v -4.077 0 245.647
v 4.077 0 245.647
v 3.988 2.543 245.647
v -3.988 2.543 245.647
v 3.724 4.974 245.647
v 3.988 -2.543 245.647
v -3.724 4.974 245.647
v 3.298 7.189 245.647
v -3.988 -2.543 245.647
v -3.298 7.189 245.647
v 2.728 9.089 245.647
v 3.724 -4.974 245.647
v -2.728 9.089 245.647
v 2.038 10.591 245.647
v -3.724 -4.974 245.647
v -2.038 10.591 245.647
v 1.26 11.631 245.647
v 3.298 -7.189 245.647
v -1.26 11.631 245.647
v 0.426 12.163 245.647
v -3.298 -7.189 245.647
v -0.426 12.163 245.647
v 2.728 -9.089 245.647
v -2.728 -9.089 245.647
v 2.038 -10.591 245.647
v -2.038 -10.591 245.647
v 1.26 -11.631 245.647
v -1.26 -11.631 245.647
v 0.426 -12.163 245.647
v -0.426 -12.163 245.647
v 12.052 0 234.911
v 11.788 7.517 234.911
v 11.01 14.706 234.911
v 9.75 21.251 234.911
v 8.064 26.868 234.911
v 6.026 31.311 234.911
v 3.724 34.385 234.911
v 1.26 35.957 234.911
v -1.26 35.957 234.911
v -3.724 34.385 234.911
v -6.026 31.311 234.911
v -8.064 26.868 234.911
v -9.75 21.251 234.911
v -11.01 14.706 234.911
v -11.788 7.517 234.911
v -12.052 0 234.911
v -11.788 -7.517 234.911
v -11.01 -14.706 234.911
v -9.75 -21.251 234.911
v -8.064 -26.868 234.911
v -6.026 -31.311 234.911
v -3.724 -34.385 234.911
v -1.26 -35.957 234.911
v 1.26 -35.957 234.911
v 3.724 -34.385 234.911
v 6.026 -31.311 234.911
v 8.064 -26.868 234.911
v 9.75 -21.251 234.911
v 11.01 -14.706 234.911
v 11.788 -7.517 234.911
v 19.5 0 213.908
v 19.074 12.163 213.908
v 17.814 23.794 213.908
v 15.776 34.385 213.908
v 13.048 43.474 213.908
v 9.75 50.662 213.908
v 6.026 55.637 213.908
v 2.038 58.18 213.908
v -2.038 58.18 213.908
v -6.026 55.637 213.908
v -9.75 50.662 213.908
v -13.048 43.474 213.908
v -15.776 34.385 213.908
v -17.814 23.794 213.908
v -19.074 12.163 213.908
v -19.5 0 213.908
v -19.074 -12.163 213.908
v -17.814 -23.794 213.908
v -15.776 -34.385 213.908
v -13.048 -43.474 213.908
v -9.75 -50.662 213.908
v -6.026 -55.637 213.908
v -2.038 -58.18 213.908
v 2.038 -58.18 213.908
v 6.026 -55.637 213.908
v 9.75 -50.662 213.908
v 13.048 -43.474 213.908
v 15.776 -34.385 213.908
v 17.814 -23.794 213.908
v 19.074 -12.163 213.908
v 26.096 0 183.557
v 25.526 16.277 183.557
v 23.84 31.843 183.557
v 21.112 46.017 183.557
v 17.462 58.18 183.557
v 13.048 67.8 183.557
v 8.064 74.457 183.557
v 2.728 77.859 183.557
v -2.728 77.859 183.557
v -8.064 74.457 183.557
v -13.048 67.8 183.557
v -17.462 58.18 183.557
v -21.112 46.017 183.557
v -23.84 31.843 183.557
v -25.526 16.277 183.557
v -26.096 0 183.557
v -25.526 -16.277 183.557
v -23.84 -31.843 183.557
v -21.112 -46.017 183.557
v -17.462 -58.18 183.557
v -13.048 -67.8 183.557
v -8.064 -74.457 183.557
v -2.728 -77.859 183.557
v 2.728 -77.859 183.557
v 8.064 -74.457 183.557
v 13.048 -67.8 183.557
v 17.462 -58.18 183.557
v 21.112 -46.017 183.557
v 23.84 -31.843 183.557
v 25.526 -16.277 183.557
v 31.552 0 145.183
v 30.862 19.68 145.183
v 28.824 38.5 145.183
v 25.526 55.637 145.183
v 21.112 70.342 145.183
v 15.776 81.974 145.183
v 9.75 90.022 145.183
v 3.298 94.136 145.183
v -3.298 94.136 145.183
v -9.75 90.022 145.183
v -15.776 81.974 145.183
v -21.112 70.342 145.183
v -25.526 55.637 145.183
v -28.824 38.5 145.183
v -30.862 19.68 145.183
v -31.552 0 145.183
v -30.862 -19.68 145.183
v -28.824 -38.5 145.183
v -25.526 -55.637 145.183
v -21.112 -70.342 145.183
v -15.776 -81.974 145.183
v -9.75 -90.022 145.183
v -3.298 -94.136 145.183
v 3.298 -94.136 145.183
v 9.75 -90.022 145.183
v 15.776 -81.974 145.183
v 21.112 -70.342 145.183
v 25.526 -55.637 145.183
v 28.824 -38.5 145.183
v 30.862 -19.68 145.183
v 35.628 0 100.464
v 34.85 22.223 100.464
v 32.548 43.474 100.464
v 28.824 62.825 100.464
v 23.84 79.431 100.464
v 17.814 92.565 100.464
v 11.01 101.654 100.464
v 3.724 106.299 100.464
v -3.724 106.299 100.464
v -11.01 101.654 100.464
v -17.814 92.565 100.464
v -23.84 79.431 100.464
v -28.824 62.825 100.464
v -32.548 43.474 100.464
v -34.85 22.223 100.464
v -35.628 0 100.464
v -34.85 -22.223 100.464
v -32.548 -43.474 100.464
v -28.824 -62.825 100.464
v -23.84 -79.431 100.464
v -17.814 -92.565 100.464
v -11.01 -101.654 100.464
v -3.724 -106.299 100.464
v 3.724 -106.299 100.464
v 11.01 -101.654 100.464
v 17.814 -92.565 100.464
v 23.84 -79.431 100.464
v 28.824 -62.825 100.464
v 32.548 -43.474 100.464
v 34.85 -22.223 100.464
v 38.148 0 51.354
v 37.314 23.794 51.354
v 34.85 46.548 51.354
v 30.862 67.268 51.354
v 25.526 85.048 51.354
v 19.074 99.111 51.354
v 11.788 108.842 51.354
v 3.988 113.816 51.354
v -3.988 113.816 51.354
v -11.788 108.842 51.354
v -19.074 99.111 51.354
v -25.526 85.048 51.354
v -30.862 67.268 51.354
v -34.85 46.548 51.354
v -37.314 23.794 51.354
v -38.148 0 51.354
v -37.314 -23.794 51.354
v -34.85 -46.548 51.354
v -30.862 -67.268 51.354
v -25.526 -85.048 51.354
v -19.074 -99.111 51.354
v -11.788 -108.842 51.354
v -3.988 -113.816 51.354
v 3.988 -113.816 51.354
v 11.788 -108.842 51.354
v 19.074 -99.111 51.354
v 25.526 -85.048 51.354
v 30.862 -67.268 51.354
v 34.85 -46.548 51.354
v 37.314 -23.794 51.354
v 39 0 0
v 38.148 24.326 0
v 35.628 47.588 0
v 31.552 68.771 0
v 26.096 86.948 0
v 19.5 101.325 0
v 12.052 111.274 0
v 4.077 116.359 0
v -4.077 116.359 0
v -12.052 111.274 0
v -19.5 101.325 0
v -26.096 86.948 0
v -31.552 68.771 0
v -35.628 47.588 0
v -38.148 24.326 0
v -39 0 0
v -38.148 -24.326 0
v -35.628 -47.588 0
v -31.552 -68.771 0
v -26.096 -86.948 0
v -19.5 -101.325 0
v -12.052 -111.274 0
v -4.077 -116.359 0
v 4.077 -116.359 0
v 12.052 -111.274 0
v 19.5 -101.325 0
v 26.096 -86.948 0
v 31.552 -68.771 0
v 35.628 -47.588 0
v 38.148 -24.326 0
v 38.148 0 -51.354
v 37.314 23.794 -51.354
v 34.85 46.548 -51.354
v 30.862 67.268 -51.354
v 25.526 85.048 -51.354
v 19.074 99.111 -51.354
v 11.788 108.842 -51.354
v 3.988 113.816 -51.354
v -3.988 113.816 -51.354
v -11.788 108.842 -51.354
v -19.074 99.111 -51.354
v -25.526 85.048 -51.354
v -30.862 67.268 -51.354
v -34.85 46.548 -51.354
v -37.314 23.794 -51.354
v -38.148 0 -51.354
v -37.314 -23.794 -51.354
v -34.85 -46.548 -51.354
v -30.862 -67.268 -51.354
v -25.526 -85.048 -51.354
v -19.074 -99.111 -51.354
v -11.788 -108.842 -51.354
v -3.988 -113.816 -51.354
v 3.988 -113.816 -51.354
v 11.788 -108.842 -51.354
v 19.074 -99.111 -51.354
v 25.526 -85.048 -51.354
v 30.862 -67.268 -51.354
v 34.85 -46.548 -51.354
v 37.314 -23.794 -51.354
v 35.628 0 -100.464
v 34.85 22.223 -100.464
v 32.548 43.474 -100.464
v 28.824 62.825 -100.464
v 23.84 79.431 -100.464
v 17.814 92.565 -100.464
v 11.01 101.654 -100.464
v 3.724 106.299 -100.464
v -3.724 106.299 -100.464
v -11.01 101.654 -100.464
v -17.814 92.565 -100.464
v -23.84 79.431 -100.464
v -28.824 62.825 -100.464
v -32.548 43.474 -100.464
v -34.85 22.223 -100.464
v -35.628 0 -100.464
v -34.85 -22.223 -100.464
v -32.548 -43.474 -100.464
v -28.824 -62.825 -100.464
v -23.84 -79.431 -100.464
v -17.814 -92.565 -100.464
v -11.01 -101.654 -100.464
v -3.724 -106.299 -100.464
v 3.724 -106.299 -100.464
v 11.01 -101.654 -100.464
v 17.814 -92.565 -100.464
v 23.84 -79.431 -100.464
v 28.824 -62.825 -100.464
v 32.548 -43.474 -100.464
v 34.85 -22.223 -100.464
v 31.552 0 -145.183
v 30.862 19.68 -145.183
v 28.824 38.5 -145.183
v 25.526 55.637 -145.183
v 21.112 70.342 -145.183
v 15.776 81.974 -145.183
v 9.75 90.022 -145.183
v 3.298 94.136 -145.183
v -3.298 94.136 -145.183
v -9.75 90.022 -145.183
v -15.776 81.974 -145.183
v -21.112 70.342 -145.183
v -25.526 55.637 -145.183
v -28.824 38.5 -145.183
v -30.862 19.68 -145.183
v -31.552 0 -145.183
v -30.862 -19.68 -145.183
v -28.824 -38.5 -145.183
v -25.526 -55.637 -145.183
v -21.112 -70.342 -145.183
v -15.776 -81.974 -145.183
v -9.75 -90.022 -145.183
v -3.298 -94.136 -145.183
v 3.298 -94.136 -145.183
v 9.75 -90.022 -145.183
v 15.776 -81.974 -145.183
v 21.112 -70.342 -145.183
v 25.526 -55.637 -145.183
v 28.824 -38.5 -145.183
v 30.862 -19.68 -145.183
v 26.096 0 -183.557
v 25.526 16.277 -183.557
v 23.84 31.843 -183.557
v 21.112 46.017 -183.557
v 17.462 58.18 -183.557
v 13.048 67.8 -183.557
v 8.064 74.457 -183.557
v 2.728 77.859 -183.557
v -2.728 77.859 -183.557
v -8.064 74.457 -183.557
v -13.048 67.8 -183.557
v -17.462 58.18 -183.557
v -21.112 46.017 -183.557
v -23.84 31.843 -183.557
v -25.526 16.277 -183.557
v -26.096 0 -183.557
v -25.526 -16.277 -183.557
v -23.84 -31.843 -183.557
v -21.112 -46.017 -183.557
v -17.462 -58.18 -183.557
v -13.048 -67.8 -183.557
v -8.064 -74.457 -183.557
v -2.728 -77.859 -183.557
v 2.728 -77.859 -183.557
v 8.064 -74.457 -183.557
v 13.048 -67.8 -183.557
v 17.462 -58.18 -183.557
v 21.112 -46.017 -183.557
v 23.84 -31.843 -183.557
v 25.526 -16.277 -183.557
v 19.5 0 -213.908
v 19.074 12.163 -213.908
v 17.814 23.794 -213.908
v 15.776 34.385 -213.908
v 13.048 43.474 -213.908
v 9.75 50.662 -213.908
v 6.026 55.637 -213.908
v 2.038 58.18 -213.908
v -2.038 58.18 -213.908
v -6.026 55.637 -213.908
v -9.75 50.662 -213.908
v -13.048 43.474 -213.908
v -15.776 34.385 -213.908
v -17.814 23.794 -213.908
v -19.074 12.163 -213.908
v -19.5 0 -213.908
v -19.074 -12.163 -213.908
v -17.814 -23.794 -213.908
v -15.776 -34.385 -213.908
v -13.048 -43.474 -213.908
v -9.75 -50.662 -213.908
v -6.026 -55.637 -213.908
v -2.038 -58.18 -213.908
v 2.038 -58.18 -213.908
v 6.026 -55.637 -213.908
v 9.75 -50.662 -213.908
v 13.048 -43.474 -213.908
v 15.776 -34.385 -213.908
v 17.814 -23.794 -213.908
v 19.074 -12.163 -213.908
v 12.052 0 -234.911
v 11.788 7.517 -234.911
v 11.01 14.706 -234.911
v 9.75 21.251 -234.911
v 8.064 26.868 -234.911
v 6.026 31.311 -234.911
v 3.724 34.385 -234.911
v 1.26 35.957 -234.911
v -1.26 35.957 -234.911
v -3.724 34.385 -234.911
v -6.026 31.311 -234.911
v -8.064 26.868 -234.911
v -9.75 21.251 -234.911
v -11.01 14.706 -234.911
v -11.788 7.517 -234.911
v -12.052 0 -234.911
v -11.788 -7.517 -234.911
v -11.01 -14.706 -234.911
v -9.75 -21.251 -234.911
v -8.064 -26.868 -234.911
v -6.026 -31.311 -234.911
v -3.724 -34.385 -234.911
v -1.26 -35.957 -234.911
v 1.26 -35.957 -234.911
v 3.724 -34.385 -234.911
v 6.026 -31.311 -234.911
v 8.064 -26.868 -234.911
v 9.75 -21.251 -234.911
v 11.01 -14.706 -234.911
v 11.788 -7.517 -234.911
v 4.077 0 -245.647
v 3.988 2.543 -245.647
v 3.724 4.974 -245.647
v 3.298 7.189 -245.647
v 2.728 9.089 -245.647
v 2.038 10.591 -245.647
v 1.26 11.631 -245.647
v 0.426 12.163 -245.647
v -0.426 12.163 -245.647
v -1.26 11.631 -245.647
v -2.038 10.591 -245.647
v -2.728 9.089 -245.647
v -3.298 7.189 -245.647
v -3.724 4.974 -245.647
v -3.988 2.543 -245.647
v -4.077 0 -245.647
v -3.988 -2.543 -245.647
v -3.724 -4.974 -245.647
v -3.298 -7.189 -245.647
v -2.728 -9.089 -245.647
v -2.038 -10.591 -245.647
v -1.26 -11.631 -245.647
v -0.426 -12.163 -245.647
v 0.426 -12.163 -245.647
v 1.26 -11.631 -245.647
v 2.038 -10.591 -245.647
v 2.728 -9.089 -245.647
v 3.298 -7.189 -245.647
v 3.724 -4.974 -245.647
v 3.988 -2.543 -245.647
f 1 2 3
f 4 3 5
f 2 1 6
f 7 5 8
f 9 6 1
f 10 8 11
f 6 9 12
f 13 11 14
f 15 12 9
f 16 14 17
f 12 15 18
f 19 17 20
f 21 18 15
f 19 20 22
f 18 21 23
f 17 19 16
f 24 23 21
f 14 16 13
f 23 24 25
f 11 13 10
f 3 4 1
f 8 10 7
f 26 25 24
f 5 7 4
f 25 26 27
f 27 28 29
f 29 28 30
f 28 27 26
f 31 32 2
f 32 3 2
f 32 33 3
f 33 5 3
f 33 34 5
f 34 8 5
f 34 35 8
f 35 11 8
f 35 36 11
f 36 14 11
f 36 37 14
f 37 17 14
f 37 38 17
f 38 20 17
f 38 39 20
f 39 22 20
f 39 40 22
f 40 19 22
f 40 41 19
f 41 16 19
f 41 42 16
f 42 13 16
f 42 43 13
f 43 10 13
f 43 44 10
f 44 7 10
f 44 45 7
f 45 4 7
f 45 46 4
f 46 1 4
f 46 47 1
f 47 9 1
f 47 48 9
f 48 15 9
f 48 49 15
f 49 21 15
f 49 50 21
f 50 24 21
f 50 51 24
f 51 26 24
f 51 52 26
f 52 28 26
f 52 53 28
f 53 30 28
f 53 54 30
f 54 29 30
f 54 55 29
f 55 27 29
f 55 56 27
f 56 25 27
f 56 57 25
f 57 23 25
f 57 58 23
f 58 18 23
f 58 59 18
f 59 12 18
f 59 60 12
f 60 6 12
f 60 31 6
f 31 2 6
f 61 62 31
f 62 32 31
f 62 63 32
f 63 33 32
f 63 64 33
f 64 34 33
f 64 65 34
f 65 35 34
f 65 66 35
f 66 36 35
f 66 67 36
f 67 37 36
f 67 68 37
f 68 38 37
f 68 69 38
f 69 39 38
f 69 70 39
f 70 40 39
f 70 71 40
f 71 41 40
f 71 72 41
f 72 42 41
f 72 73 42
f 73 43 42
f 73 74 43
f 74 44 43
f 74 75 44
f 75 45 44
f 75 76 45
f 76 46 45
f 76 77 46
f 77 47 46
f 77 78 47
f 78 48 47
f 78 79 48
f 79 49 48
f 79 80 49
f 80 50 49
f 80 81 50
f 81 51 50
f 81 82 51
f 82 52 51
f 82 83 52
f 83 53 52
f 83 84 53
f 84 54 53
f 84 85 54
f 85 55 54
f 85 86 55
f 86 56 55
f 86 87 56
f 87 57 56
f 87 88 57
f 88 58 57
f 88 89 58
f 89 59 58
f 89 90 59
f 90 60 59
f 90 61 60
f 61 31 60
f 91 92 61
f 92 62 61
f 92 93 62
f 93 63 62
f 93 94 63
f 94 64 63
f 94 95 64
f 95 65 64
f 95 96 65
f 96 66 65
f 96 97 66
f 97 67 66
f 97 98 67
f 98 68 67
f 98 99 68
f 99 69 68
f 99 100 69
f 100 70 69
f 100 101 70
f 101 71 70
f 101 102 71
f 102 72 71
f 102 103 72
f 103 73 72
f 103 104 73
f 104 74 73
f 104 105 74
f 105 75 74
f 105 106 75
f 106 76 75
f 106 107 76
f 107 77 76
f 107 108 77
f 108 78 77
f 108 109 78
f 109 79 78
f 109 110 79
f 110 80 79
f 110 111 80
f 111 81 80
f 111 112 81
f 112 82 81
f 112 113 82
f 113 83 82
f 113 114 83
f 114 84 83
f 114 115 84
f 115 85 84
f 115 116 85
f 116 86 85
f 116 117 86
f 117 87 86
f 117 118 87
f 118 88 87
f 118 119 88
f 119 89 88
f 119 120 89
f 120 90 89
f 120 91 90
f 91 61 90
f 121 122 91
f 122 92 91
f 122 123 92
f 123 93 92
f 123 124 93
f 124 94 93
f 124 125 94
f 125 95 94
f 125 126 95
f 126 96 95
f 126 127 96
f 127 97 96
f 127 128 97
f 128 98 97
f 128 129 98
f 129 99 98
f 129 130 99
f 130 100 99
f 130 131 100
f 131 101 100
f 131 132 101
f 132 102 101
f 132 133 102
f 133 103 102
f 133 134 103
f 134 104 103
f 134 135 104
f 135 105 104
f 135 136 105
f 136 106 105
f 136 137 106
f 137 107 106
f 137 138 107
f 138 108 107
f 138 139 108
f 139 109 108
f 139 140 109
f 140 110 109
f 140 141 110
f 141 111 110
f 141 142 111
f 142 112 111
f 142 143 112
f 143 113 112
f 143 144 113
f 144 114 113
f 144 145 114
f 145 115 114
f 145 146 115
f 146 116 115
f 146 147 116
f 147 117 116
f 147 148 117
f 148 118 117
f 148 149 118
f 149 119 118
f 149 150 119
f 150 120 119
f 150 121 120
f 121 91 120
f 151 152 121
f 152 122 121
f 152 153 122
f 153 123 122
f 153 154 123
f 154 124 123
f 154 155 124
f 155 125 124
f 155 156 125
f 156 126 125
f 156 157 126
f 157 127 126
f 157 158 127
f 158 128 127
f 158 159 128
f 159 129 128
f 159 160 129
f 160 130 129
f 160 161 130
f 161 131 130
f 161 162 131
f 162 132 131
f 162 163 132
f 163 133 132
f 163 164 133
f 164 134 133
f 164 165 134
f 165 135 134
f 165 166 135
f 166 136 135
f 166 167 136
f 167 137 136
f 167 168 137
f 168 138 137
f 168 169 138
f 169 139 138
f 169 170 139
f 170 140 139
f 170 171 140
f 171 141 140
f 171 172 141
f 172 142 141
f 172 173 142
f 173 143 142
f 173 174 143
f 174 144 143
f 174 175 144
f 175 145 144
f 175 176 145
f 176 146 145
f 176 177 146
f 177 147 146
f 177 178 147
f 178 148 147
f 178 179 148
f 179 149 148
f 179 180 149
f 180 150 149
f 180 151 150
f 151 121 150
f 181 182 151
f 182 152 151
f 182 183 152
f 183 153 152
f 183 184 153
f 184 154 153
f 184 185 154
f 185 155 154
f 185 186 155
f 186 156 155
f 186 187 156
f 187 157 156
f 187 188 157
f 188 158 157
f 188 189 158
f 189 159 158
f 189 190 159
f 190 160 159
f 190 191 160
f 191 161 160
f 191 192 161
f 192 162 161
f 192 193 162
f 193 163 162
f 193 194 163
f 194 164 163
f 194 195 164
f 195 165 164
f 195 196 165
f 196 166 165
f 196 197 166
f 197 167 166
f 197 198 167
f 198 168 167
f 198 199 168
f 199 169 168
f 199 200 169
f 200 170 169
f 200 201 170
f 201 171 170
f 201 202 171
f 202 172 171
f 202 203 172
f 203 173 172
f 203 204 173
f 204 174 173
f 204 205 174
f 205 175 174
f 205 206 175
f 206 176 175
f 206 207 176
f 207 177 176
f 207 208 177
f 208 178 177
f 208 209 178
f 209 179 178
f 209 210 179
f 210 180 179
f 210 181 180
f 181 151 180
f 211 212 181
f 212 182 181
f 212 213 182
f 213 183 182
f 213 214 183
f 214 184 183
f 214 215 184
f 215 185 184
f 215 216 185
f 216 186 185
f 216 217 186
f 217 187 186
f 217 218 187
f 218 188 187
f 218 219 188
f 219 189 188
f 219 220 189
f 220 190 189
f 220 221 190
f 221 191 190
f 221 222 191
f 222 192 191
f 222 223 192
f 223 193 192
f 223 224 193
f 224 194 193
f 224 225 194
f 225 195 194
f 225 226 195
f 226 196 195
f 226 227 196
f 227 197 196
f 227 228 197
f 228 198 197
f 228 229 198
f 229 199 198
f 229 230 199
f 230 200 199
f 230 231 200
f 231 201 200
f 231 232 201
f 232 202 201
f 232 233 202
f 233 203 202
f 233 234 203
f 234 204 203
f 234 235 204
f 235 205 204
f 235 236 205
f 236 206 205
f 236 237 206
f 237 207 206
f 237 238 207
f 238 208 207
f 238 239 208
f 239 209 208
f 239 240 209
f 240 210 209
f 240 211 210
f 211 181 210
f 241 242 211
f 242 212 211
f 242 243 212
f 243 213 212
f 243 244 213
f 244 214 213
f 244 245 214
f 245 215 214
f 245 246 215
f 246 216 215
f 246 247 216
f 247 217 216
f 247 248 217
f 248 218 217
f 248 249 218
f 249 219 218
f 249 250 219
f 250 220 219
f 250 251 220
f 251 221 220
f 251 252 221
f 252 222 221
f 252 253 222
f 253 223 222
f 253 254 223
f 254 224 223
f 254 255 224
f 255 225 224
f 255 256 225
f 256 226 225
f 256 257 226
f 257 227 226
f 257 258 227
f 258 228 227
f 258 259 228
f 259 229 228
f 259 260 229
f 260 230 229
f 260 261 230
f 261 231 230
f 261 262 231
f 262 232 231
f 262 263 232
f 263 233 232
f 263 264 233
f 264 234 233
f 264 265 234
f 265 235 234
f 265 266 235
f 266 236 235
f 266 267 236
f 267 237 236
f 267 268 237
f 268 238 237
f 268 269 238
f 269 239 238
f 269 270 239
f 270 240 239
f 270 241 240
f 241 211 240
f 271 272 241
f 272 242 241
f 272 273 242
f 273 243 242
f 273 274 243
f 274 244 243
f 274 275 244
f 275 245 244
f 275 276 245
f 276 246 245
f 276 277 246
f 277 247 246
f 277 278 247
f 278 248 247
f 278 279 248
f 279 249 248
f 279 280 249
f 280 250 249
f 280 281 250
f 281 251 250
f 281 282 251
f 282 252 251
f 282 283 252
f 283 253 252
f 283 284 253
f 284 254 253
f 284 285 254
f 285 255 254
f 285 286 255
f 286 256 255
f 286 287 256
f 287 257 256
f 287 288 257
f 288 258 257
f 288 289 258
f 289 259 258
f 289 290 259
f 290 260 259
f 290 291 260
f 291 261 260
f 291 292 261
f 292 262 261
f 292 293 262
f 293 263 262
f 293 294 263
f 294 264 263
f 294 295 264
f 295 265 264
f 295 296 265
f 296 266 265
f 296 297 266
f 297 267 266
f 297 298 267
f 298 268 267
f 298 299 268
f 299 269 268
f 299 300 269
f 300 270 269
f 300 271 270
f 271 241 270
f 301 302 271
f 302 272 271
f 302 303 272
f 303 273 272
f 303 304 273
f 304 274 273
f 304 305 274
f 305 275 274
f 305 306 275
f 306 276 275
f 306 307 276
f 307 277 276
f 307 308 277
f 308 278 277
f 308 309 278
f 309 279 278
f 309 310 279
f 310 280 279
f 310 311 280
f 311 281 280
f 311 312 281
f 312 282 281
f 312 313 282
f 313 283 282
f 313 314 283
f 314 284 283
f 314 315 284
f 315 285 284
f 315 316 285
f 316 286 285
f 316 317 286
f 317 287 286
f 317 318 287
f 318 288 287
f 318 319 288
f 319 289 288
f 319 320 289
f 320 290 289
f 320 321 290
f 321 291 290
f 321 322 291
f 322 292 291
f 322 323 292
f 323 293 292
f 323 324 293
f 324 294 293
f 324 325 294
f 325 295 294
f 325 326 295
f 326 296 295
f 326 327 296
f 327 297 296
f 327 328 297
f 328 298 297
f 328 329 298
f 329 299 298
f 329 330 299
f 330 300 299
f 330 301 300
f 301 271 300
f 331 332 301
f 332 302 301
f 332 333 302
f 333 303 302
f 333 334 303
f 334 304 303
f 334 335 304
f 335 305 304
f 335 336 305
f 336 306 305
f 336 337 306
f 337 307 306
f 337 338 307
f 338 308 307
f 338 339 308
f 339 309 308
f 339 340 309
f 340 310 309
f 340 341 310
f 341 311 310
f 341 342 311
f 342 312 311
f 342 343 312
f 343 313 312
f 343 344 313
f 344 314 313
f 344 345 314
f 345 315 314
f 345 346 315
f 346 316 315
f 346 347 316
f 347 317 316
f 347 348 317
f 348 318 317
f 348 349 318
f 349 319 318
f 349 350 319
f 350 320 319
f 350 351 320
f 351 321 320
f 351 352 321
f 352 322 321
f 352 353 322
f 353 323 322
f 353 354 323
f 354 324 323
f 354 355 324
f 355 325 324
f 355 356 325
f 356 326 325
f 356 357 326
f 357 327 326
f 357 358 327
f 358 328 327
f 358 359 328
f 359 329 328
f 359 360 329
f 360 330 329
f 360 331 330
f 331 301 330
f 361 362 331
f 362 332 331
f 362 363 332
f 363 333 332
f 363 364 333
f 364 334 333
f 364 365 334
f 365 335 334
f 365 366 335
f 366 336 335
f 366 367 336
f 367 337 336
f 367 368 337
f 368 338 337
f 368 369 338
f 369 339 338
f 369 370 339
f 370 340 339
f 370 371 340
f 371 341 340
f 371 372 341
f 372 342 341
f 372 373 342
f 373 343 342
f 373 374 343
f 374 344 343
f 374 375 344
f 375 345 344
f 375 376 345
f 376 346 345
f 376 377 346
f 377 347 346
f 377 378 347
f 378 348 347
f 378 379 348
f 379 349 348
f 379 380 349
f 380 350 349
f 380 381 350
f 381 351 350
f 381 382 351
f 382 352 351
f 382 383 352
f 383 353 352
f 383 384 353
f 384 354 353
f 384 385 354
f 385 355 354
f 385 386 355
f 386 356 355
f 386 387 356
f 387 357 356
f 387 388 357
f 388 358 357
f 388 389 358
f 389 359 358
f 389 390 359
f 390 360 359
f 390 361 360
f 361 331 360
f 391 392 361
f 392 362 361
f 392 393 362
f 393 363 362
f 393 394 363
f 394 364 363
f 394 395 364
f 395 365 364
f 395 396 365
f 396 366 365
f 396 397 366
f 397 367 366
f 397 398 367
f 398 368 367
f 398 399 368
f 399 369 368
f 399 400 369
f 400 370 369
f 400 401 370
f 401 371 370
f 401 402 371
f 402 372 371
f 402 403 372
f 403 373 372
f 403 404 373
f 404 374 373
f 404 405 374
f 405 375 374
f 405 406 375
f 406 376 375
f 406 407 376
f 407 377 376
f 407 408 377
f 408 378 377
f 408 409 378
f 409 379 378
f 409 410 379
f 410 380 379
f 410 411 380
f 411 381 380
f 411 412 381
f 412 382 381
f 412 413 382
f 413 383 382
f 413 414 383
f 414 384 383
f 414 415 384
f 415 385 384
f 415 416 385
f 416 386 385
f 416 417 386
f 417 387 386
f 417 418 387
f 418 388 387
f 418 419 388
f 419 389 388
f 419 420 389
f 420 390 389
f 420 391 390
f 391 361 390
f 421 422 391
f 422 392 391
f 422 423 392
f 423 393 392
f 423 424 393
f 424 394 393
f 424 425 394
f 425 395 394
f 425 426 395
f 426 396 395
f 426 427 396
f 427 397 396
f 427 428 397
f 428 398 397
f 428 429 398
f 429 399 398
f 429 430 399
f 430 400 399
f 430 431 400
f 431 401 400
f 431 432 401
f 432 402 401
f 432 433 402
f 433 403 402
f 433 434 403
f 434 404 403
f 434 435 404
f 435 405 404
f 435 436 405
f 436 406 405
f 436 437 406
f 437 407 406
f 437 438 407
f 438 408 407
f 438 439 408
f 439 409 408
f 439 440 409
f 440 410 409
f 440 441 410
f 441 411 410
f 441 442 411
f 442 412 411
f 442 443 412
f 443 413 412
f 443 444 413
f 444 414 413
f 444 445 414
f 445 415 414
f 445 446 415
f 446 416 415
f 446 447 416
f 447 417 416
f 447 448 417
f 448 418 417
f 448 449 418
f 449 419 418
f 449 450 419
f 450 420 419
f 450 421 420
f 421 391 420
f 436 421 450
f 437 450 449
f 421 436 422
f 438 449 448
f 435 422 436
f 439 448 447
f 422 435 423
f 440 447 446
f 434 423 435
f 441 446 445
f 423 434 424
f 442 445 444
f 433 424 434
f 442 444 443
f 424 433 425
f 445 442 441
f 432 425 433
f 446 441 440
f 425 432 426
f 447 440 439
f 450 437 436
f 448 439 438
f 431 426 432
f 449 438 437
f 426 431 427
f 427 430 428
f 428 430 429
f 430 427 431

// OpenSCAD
// Generated by SolidPython 1.0.1 on 2020-07-29 00:46:45


scale(v = [3, 9, 19]) {
	sphere(r = 13);
}
/***********************************************
*********      SolidPython code:      **********
************************************************
 
# import packages: SolidPython
from solid import *
from solid.utils import *
from itertools import chain, combinations, permutations


class Resize:

    def __init__(self, scad_file):
        self.scad_file = scad_file
        #self.scad_file = import_scad(scad_file)
        # cone/cylinder param:
        self.r1 = 0
        self.r2 = 0
        self.h = 0
        # rectangular prism param:
        self.w = 0
        self.l = 0
        # ellipse param:
        self.r = 0

    # import OpenScad code (file name corresponds to shape)


    # classify shape + parameters
    def assign(self, param1, param2, param3):
        if self.scad_file == 'cone.scad':
            self.r1 = param1
            self.r2 = param2
            self.h = param3
        elif self.scad_file == 'cylinder.scad':
            self.r1 = param1
            self.r2 = param2
            self.h = param3
        elif self.scad_file == 'rectangularPrism.scad':
            self.h = param1
            self.l = param2
            self.w = param3
        else:
            self.r = param1
            self.h = param2

    # resize parameters
    def iterate(self):
        x = range(3, 20, 2)
        i = 1
        if self.scad_file == 'cone.scad':
            tempList = list(permutations(x, 2))
            for temp in tempList:
                param1 = temp[0]
                param2 = temp[1]
                filepath = 'produced_scad_files/' + 'cone' + str(param1) + '_' + str(param2) + '_' + '.scad'
                scad_render_to_file(cylinder(h=param1, r1=param2, r2=0), filepath)

        elif self.scad_file == 'cylinder.scad':
            tempList = list(permutations(x, 3))
            for temp in tempList:
                param1 = temp[0]
                param2 = temp[1]
                filepath = 'produced_scad_files/' + 'cylinder' + str(param1) + '_' + str(param2) + '_' + '.scad'
                scad_render_to_file(cylinder(h=param1, r1=param2, r2=param2), filepath)

        elif self.scad_file == 'rectangularPrism.scad':
            tempList = list(permutations(x, 3))
            for temp in tempList:
                param1 = temp[0]
                param2 = temp[1]
                param3 = temp[2]
                filepath = 'produced_scad_files/' + 'rectangularPrism' + str(param1) + '_' + str(param2) + '_' + str(
                    param3) + '.scad'
                scad_render_to_file(cube(size=(param1, param2, param3)), filepath)

        elif self.scad_file == 'ellipse.scad':
            tempList = list(permutations(x, 4))
            for temp in tempList:
                param1 = temp[0]
                param2 = temp[1]
                param3 = temp[2]
                param4 = temp[3]
                filepath = 'produced_scad_files/' + 'ellipse' + str(param1) + '_' + str(param2) + '_' + str(param3) + '_' + str(param4) + '.scad'
                scad_render_to_file(scale([param1, param2, param3])(sphere(r=param4)), filepath)

    def render_to_scadfile(self):
        scad_render_to_file(scad, 'example.scad') 
 
************************************************/
